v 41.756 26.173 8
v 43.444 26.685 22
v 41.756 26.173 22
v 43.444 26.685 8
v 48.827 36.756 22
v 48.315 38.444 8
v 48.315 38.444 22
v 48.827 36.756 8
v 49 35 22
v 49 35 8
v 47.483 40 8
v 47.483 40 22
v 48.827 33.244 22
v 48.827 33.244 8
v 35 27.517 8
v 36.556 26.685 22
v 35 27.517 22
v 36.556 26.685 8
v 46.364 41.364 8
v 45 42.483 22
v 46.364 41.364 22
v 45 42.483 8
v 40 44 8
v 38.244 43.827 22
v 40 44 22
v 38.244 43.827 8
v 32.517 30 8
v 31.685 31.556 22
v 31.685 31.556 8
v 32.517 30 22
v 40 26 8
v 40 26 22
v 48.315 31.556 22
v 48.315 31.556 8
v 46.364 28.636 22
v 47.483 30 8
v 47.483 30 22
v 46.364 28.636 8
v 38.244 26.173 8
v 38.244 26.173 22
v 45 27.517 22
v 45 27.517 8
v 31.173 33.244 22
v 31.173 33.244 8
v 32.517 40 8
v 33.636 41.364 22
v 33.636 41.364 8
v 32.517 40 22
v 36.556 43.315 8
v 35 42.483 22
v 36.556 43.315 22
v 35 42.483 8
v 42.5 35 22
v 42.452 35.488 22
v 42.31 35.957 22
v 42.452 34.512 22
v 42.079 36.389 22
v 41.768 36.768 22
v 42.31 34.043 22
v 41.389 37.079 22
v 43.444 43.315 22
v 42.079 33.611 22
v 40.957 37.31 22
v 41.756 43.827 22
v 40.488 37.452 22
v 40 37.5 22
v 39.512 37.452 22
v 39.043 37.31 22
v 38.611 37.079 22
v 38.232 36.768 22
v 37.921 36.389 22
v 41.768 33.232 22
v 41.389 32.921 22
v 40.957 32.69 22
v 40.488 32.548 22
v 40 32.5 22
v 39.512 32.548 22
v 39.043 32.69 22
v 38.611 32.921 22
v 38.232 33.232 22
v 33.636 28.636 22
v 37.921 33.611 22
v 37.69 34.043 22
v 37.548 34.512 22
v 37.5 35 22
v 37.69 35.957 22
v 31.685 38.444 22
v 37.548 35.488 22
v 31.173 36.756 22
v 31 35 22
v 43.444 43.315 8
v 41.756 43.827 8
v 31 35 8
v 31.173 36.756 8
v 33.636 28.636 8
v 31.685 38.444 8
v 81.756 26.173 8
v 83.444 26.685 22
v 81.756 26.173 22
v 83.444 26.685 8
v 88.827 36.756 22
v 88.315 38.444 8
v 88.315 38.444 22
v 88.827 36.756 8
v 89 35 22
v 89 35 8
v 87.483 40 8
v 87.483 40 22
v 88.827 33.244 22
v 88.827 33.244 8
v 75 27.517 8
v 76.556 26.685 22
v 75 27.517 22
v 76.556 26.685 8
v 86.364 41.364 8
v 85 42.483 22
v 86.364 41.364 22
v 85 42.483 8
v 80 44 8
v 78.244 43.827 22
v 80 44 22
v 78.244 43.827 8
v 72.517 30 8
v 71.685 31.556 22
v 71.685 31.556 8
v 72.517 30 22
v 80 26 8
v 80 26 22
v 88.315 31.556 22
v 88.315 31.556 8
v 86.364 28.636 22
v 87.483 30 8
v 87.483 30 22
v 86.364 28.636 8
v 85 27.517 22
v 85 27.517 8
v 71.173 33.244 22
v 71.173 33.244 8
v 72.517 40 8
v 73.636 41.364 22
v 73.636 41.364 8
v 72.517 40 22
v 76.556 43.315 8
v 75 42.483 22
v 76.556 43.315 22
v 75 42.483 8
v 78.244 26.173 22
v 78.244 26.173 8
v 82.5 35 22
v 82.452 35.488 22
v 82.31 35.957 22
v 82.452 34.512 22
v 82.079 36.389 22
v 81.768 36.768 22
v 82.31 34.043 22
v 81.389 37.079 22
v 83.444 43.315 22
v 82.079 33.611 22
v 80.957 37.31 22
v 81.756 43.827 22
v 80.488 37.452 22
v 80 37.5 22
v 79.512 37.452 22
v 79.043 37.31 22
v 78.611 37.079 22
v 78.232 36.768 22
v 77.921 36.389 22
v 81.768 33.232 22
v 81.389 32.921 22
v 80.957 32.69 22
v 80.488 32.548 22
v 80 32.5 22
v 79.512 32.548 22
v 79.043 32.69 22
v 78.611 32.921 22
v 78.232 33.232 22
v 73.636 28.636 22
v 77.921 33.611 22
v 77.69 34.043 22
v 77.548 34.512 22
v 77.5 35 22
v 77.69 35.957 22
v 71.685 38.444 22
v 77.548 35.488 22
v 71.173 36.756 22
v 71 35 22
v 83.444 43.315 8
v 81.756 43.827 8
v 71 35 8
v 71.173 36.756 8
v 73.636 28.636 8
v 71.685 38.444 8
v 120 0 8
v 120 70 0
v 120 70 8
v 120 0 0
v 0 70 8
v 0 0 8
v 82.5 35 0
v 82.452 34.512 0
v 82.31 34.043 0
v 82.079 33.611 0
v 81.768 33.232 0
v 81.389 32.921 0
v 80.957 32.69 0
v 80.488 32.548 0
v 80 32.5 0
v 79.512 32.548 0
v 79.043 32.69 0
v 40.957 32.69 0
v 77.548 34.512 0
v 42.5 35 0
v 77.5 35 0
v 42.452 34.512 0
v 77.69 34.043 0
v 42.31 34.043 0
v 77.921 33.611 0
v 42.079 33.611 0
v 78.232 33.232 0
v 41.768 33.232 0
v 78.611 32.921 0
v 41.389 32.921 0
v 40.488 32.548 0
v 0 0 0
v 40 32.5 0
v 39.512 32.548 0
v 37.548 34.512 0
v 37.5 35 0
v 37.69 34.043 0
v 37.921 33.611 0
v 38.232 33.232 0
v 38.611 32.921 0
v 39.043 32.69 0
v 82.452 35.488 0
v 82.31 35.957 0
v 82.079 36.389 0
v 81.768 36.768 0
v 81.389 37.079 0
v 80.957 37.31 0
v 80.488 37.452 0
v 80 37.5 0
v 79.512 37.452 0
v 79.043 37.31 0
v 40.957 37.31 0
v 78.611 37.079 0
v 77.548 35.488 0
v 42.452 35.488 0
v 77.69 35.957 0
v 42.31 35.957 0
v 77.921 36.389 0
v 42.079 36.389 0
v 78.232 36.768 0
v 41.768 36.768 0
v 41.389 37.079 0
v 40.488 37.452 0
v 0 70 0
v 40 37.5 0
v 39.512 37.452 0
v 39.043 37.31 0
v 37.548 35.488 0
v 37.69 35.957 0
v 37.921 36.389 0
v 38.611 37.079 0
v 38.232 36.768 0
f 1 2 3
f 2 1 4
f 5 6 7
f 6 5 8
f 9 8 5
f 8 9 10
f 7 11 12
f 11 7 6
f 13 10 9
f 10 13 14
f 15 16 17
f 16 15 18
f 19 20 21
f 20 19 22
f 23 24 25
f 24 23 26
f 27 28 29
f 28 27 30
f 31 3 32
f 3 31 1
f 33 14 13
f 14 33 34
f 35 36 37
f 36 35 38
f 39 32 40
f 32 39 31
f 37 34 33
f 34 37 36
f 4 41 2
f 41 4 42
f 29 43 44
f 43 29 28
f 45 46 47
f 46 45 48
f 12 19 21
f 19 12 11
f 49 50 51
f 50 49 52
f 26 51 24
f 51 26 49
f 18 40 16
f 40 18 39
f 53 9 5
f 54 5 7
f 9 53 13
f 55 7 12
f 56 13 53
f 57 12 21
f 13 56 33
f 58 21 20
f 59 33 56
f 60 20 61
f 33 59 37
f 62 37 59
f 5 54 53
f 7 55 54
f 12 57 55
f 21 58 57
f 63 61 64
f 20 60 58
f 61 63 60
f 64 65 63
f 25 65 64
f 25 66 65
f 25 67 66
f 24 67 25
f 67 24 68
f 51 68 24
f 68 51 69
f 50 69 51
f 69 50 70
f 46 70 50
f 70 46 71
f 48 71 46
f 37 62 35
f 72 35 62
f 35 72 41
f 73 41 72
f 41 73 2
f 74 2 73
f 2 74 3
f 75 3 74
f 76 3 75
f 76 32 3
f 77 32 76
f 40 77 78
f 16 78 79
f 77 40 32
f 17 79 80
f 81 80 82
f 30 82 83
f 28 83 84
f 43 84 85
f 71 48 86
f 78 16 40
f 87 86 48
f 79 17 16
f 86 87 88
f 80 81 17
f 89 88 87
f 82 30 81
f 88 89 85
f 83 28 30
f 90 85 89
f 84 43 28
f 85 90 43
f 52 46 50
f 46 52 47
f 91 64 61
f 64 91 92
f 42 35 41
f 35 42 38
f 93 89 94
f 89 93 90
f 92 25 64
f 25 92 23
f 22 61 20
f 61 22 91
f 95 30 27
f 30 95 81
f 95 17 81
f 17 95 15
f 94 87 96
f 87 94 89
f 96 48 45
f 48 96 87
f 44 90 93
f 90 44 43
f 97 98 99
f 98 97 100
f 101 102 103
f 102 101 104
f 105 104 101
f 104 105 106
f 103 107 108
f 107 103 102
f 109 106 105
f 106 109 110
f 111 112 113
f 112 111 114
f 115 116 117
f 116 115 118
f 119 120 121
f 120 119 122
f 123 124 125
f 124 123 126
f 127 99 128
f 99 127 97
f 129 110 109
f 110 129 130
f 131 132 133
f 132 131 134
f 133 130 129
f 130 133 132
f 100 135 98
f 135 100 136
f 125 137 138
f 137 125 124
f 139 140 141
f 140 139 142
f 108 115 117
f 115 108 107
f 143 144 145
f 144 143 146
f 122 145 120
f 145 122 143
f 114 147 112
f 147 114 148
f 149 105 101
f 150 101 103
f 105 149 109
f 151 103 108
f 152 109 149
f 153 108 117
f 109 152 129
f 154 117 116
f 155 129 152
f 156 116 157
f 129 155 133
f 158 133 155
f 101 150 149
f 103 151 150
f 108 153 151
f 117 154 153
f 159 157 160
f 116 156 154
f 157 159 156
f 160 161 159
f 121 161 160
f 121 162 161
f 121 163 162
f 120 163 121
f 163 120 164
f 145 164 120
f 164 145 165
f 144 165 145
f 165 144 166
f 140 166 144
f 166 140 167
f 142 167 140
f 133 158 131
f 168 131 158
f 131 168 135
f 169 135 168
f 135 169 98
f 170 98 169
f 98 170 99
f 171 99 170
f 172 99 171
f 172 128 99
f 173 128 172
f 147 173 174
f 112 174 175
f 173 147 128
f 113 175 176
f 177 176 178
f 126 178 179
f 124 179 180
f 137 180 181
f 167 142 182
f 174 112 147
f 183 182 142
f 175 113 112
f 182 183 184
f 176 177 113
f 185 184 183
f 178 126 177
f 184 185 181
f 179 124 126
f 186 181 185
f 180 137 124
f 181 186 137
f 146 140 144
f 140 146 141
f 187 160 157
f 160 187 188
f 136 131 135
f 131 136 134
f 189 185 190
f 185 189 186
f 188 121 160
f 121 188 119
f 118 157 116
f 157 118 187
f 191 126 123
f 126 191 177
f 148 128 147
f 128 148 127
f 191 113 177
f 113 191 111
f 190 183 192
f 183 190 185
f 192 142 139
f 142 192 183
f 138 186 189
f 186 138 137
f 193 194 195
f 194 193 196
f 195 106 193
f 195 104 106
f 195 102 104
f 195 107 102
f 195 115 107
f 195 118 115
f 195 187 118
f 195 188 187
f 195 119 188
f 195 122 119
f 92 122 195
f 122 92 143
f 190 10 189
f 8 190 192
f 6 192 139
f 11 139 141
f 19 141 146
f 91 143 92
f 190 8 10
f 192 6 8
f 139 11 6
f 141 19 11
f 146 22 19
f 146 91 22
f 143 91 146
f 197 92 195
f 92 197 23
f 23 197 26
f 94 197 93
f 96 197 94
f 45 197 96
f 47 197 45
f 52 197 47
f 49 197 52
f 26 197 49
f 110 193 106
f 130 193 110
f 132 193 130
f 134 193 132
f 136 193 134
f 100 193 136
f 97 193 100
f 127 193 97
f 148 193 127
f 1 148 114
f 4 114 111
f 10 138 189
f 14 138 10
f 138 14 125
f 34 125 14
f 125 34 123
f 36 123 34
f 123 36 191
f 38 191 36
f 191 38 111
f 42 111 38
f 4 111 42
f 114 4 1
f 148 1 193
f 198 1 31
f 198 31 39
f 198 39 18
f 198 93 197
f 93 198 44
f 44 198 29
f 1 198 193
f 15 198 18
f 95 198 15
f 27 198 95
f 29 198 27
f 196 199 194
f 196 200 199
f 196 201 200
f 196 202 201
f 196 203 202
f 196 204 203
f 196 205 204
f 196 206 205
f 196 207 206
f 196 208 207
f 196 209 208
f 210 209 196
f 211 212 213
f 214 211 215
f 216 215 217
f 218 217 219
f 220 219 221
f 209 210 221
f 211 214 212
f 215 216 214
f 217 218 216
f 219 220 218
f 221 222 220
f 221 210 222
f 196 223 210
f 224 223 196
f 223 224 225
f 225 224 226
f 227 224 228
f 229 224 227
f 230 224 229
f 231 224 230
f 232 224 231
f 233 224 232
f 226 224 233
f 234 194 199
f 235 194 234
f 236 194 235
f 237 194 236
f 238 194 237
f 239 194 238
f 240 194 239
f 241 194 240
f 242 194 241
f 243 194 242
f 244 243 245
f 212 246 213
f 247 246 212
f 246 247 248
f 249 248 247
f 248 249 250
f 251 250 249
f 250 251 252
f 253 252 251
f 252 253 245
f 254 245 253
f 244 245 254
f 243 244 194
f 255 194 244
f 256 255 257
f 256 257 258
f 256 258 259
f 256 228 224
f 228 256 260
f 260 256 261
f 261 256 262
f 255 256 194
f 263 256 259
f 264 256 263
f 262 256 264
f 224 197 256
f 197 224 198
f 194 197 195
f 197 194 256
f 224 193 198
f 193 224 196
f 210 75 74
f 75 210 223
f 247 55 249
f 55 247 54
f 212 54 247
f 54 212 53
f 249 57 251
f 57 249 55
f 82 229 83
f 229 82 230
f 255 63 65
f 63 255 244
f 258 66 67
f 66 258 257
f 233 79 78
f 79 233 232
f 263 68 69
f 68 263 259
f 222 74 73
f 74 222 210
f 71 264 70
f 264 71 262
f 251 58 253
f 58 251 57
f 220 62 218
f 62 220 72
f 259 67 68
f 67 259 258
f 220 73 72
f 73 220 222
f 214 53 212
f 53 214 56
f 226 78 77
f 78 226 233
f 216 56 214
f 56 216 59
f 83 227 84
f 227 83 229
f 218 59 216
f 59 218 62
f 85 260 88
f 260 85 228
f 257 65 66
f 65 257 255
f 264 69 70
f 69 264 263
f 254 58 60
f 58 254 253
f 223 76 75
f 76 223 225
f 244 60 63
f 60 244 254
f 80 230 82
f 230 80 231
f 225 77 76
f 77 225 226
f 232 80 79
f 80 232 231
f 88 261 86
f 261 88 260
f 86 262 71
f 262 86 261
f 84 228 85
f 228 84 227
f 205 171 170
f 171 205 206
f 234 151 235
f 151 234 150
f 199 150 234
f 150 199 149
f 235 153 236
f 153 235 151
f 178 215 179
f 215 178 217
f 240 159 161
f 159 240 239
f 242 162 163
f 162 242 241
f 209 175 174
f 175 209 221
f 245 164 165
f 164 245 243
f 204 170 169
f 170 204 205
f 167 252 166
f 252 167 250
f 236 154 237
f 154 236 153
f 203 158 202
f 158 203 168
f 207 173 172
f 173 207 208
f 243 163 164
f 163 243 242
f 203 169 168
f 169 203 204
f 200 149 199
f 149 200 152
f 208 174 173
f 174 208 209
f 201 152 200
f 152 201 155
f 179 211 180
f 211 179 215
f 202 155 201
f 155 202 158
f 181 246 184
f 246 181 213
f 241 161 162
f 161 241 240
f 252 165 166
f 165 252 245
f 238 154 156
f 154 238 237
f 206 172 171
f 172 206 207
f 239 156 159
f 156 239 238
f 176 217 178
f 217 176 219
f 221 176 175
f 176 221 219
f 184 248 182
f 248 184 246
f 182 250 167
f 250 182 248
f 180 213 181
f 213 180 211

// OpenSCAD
$fn = 32;

// ----------------------------------------------------------------------
// Drill jig: two_boss jig
// ----------------------------------------------------------------------

// --- parameters (mm) ---
plate_l = 120;            // plate length, X
plate_w = 70;             // plate width, Y
plate_t = 8;              // plate thickness
boss_d = 18;              // guide boss diameter
boss_h = 15;              // boss height above the plate
guide_d = 5;              // guide hole diameter
boss_pitch = 40;          // boss pitch

n_boss = 2;  // guide bosses
boss_x0 = (plate_l - (n_boss - 1) * boss_pitch) / 2;  // first boss X
boss_top = plate_t - 1 + boss_h;  // boss crown height
total_h = boss_top;  // overall height

difference() {
  union() {
  cube([plate_l, plate_w, plate_t]);
  for (i = [0 : n_boss - 1])
    translate([boss_x0 + i * boss_pitch, plate_w / 2, plate_t - 1])
      cylinder(h = boss_h, d = boss_d);
  }
  for (i = [0 : n_boss - 1])
    translate([boss_x0 + i * boss_pitch, plate_w / 2, -1])
      cylinder(h = plate_t + boss_h, d = guide_d);
}
